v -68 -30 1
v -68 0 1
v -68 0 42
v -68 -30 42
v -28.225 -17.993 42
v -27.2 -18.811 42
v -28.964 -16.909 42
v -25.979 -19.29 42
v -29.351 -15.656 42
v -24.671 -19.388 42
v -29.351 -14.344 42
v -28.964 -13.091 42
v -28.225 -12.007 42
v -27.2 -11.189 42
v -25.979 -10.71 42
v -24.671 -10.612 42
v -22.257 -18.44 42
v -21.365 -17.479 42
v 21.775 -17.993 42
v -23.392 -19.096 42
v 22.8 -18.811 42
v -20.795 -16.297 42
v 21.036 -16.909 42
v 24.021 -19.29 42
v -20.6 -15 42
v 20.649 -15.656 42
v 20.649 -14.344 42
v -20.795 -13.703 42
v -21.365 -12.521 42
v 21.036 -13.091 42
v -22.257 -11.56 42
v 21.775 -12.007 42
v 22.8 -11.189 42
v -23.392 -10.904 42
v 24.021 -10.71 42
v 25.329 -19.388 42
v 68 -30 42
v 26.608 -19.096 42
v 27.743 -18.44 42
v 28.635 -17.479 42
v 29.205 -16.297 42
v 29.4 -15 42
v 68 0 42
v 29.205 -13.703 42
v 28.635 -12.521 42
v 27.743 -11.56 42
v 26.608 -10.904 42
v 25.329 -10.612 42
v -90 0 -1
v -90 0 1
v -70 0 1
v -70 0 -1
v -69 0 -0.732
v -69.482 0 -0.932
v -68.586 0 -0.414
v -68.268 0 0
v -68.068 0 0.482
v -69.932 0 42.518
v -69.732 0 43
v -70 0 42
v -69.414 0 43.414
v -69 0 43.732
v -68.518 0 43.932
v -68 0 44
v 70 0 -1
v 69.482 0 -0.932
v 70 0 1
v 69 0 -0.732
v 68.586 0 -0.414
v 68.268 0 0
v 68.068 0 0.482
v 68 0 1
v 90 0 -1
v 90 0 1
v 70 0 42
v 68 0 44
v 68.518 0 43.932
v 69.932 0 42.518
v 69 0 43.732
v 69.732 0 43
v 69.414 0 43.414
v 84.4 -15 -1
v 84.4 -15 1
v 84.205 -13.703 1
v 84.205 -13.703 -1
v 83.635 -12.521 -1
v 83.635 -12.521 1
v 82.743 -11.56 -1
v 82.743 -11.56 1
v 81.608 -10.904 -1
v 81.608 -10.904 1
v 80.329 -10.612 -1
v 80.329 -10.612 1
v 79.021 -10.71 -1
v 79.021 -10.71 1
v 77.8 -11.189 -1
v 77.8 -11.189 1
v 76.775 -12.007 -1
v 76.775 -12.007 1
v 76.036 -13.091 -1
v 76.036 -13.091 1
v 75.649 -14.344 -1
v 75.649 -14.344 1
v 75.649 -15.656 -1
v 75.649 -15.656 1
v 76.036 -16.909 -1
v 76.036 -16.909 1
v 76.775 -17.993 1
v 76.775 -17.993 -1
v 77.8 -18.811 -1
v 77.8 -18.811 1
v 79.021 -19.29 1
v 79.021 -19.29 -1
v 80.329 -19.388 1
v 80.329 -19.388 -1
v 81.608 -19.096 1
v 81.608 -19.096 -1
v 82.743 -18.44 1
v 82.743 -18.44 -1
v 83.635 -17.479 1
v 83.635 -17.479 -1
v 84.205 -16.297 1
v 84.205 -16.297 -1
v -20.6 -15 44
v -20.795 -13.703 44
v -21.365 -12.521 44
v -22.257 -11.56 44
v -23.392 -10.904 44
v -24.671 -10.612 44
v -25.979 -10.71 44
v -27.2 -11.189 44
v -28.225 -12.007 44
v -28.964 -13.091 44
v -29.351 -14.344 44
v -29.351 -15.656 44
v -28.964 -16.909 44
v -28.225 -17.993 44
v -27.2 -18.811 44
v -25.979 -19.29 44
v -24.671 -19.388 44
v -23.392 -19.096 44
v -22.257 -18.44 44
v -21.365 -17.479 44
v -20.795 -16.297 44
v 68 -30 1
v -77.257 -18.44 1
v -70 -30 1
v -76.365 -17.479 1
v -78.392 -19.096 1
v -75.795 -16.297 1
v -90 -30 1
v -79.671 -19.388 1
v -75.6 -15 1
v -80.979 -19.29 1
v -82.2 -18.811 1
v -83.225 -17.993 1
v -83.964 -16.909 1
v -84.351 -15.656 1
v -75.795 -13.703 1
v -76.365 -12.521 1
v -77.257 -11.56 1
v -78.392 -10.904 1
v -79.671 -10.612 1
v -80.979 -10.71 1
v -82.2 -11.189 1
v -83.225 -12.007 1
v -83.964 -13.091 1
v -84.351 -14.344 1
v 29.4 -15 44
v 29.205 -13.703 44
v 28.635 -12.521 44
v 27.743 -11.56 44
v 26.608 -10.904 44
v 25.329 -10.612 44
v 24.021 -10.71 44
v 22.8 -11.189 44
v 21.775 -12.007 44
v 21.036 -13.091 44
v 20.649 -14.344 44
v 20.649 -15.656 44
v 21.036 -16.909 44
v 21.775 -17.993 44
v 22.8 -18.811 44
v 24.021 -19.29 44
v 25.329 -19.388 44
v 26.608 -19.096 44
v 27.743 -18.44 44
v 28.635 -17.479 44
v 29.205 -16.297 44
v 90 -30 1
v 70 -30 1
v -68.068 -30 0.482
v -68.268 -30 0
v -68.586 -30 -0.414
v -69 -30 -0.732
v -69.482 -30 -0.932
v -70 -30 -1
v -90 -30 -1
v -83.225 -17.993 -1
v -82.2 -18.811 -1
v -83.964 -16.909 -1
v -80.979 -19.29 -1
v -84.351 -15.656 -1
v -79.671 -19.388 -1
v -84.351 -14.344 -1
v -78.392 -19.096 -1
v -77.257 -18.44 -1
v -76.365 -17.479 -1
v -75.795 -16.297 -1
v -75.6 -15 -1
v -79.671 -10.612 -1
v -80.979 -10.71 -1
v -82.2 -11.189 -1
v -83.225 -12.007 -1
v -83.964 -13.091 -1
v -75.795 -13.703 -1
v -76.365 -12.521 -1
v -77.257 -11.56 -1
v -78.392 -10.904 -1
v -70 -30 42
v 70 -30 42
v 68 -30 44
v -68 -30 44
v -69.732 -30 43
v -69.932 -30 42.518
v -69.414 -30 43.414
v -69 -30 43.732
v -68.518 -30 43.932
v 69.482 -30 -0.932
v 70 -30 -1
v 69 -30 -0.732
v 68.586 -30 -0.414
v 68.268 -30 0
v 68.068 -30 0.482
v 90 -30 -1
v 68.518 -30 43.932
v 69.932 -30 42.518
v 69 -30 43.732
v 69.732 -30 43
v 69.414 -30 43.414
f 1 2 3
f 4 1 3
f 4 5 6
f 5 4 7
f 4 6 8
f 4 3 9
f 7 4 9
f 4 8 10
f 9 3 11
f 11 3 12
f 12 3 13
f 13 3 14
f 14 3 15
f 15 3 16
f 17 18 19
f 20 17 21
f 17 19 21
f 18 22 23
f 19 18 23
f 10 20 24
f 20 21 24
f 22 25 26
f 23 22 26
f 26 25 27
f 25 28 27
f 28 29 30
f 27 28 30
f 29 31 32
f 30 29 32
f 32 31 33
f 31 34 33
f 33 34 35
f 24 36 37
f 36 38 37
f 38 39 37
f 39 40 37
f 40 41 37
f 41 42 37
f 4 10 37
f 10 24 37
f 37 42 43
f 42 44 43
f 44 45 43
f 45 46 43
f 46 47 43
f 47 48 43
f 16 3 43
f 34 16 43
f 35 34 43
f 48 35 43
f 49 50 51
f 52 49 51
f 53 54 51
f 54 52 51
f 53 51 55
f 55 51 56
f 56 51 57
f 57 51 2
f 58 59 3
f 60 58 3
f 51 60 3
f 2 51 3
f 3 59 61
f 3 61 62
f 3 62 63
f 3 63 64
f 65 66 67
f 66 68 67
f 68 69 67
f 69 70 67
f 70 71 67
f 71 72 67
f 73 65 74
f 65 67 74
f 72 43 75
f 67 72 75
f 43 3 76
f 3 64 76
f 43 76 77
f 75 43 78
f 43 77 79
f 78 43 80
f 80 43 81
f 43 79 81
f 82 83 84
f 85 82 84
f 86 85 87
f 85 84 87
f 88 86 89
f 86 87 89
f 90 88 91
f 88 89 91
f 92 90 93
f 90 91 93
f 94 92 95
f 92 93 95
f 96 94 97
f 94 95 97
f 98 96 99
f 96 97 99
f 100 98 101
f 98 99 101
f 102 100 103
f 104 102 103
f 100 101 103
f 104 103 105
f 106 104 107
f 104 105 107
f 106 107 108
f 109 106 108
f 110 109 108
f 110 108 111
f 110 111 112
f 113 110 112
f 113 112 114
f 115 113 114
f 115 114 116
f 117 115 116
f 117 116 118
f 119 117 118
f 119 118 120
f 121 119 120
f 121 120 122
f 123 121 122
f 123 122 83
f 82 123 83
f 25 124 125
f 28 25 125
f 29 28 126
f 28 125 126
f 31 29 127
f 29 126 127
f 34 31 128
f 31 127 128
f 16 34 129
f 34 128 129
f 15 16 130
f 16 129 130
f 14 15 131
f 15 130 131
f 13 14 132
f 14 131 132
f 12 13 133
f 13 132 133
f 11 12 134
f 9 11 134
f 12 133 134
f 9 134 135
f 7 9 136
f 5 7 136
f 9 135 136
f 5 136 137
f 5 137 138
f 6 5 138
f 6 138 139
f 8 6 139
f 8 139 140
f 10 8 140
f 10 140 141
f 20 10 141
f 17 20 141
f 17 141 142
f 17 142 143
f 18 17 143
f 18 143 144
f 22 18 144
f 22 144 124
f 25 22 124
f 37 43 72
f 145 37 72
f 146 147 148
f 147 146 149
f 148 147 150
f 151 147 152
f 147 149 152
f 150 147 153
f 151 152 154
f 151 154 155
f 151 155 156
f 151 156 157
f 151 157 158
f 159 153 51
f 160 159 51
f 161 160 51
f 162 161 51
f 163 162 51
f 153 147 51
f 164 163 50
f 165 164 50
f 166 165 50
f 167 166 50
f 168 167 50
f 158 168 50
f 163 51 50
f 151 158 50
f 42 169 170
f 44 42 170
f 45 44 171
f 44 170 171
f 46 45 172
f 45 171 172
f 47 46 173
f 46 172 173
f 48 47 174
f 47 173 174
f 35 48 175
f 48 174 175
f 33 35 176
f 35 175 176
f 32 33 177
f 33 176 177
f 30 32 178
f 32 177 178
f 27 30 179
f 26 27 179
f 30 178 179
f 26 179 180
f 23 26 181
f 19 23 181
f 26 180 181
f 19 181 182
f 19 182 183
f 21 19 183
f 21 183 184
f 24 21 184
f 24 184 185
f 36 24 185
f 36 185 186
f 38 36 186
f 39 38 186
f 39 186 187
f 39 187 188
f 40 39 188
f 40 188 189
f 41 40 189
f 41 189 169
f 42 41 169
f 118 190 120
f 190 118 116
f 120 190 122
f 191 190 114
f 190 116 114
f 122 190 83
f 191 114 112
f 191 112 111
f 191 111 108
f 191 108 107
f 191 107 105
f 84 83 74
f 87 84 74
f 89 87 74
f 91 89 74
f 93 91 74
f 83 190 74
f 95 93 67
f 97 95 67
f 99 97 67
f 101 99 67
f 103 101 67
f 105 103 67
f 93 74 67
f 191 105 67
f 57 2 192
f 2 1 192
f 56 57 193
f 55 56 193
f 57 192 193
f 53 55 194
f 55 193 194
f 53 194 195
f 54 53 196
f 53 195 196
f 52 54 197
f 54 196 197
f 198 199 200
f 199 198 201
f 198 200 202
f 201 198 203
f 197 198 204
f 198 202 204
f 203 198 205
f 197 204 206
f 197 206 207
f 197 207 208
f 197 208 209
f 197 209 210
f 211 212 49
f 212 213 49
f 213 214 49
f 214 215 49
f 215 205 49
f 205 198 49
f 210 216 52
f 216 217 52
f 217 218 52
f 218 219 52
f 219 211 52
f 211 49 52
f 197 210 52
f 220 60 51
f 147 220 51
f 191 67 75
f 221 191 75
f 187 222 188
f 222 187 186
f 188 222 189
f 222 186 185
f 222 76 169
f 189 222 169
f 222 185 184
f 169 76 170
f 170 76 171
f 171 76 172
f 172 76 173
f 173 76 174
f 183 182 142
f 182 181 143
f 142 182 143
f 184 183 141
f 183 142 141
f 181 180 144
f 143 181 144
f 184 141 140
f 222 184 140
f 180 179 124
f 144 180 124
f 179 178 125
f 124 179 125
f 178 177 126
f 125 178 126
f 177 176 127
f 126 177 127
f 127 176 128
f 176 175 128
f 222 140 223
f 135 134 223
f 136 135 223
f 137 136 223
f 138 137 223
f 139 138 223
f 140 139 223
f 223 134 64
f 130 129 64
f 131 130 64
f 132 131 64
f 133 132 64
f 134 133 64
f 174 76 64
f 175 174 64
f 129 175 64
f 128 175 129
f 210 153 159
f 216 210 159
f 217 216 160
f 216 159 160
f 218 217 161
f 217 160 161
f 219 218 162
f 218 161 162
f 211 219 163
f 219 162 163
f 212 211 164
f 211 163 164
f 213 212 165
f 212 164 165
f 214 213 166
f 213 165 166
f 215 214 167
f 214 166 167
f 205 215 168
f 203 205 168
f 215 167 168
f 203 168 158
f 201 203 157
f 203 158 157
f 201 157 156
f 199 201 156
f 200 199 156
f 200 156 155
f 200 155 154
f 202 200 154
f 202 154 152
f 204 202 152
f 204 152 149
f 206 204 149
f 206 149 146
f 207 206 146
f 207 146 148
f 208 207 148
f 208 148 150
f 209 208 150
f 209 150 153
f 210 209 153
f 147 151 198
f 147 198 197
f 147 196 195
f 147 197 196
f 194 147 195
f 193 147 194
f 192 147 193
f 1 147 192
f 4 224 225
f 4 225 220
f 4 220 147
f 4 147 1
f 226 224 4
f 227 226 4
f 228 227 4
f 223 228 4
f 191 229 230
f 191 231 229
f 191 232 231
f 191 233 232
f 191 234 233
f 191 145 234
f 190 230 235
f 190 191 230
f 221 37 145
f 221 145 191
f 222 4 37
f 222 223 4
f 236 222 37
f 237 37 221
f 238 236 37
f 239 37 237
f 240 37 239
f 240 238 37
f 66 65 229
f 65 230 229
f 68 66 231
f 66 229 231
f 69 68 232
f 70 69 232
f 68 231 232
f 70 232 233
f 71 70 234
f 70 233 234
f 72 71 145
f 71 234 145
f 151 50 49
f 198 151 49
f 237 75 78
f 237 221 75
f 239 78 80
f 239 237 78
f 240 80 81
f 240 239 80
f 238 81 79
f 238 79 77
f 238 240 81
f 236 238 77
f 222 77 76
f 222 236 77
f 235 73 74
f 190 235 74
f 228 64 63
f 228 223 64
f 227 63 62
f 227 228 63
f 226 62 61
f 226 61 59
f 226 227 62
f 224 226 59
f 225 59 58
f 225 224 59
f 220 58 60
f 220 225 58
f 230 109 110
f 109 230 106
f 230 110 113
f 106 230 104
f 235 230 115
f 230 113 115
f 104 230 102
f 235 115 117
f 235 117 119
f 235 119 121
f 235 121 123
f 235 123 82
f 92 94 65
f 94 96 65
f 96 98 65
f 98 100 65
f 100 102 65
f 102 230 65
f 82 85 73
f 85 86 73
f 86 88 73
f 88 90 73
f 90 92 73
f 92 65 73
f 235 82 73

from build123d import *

# Parameters (mm, degrees)
F1_DEPTH = 30
F2_R     = 4.4
F3_R     = 4.4
F4_DEPTH = 25
F5_R     = 2
F6_R     = 2


# Not quite as in the source:
# - a feature names something its author has since deleted; it is built from what else it names


with BuildPart() as f1:
    # F0 (on Front) → F1 (new body)
    with BuildSketch(Plane.XZ):
        Polygon((90, -1), (90, 1), (70, 1), (70, 44), (-70, 44), (-70, 1), (-90, 1), (-90, -1), (-68, -1), (-68, 42), (68, 42), (68, -1), align=None)
    extrude(amount=F1_DEPTH)

    # F2 (on face) + F3 (on face) → F4 (cut)
    with BuildSketch(Plane.XY.offset(1)):
        with Locations((-80, -15)):
            Circle(F2_R)
        with Locations((80, -15)):
            Circle(F2_R)
    with BuildSketch(Plane.XY.offset(44)):
        with Locations((-25, -15)):
            Circle(F3_R)
        with Locations((25, -15)):
            Circle(F3_R)
    extrude(amount=-F4_DEPTH, mode=Mode.SUBTRACT)

    # F5
    f5_edges = [f1.edges().sort_by_distance(p)[0] for p in [
        (-70, -15, 44),
        (70, -15, 44),
    ]]
    fillet(f5_edges, radius=F5_R)

    # F6
    f6_edges = [f1.edges().sort_by_distance(p)[0] for p in [
        (68, -15, -1),
        (-68, -15, -1),
    ]]
    fillet(f6_edges, radius=F6_R)


solid = f1.part
